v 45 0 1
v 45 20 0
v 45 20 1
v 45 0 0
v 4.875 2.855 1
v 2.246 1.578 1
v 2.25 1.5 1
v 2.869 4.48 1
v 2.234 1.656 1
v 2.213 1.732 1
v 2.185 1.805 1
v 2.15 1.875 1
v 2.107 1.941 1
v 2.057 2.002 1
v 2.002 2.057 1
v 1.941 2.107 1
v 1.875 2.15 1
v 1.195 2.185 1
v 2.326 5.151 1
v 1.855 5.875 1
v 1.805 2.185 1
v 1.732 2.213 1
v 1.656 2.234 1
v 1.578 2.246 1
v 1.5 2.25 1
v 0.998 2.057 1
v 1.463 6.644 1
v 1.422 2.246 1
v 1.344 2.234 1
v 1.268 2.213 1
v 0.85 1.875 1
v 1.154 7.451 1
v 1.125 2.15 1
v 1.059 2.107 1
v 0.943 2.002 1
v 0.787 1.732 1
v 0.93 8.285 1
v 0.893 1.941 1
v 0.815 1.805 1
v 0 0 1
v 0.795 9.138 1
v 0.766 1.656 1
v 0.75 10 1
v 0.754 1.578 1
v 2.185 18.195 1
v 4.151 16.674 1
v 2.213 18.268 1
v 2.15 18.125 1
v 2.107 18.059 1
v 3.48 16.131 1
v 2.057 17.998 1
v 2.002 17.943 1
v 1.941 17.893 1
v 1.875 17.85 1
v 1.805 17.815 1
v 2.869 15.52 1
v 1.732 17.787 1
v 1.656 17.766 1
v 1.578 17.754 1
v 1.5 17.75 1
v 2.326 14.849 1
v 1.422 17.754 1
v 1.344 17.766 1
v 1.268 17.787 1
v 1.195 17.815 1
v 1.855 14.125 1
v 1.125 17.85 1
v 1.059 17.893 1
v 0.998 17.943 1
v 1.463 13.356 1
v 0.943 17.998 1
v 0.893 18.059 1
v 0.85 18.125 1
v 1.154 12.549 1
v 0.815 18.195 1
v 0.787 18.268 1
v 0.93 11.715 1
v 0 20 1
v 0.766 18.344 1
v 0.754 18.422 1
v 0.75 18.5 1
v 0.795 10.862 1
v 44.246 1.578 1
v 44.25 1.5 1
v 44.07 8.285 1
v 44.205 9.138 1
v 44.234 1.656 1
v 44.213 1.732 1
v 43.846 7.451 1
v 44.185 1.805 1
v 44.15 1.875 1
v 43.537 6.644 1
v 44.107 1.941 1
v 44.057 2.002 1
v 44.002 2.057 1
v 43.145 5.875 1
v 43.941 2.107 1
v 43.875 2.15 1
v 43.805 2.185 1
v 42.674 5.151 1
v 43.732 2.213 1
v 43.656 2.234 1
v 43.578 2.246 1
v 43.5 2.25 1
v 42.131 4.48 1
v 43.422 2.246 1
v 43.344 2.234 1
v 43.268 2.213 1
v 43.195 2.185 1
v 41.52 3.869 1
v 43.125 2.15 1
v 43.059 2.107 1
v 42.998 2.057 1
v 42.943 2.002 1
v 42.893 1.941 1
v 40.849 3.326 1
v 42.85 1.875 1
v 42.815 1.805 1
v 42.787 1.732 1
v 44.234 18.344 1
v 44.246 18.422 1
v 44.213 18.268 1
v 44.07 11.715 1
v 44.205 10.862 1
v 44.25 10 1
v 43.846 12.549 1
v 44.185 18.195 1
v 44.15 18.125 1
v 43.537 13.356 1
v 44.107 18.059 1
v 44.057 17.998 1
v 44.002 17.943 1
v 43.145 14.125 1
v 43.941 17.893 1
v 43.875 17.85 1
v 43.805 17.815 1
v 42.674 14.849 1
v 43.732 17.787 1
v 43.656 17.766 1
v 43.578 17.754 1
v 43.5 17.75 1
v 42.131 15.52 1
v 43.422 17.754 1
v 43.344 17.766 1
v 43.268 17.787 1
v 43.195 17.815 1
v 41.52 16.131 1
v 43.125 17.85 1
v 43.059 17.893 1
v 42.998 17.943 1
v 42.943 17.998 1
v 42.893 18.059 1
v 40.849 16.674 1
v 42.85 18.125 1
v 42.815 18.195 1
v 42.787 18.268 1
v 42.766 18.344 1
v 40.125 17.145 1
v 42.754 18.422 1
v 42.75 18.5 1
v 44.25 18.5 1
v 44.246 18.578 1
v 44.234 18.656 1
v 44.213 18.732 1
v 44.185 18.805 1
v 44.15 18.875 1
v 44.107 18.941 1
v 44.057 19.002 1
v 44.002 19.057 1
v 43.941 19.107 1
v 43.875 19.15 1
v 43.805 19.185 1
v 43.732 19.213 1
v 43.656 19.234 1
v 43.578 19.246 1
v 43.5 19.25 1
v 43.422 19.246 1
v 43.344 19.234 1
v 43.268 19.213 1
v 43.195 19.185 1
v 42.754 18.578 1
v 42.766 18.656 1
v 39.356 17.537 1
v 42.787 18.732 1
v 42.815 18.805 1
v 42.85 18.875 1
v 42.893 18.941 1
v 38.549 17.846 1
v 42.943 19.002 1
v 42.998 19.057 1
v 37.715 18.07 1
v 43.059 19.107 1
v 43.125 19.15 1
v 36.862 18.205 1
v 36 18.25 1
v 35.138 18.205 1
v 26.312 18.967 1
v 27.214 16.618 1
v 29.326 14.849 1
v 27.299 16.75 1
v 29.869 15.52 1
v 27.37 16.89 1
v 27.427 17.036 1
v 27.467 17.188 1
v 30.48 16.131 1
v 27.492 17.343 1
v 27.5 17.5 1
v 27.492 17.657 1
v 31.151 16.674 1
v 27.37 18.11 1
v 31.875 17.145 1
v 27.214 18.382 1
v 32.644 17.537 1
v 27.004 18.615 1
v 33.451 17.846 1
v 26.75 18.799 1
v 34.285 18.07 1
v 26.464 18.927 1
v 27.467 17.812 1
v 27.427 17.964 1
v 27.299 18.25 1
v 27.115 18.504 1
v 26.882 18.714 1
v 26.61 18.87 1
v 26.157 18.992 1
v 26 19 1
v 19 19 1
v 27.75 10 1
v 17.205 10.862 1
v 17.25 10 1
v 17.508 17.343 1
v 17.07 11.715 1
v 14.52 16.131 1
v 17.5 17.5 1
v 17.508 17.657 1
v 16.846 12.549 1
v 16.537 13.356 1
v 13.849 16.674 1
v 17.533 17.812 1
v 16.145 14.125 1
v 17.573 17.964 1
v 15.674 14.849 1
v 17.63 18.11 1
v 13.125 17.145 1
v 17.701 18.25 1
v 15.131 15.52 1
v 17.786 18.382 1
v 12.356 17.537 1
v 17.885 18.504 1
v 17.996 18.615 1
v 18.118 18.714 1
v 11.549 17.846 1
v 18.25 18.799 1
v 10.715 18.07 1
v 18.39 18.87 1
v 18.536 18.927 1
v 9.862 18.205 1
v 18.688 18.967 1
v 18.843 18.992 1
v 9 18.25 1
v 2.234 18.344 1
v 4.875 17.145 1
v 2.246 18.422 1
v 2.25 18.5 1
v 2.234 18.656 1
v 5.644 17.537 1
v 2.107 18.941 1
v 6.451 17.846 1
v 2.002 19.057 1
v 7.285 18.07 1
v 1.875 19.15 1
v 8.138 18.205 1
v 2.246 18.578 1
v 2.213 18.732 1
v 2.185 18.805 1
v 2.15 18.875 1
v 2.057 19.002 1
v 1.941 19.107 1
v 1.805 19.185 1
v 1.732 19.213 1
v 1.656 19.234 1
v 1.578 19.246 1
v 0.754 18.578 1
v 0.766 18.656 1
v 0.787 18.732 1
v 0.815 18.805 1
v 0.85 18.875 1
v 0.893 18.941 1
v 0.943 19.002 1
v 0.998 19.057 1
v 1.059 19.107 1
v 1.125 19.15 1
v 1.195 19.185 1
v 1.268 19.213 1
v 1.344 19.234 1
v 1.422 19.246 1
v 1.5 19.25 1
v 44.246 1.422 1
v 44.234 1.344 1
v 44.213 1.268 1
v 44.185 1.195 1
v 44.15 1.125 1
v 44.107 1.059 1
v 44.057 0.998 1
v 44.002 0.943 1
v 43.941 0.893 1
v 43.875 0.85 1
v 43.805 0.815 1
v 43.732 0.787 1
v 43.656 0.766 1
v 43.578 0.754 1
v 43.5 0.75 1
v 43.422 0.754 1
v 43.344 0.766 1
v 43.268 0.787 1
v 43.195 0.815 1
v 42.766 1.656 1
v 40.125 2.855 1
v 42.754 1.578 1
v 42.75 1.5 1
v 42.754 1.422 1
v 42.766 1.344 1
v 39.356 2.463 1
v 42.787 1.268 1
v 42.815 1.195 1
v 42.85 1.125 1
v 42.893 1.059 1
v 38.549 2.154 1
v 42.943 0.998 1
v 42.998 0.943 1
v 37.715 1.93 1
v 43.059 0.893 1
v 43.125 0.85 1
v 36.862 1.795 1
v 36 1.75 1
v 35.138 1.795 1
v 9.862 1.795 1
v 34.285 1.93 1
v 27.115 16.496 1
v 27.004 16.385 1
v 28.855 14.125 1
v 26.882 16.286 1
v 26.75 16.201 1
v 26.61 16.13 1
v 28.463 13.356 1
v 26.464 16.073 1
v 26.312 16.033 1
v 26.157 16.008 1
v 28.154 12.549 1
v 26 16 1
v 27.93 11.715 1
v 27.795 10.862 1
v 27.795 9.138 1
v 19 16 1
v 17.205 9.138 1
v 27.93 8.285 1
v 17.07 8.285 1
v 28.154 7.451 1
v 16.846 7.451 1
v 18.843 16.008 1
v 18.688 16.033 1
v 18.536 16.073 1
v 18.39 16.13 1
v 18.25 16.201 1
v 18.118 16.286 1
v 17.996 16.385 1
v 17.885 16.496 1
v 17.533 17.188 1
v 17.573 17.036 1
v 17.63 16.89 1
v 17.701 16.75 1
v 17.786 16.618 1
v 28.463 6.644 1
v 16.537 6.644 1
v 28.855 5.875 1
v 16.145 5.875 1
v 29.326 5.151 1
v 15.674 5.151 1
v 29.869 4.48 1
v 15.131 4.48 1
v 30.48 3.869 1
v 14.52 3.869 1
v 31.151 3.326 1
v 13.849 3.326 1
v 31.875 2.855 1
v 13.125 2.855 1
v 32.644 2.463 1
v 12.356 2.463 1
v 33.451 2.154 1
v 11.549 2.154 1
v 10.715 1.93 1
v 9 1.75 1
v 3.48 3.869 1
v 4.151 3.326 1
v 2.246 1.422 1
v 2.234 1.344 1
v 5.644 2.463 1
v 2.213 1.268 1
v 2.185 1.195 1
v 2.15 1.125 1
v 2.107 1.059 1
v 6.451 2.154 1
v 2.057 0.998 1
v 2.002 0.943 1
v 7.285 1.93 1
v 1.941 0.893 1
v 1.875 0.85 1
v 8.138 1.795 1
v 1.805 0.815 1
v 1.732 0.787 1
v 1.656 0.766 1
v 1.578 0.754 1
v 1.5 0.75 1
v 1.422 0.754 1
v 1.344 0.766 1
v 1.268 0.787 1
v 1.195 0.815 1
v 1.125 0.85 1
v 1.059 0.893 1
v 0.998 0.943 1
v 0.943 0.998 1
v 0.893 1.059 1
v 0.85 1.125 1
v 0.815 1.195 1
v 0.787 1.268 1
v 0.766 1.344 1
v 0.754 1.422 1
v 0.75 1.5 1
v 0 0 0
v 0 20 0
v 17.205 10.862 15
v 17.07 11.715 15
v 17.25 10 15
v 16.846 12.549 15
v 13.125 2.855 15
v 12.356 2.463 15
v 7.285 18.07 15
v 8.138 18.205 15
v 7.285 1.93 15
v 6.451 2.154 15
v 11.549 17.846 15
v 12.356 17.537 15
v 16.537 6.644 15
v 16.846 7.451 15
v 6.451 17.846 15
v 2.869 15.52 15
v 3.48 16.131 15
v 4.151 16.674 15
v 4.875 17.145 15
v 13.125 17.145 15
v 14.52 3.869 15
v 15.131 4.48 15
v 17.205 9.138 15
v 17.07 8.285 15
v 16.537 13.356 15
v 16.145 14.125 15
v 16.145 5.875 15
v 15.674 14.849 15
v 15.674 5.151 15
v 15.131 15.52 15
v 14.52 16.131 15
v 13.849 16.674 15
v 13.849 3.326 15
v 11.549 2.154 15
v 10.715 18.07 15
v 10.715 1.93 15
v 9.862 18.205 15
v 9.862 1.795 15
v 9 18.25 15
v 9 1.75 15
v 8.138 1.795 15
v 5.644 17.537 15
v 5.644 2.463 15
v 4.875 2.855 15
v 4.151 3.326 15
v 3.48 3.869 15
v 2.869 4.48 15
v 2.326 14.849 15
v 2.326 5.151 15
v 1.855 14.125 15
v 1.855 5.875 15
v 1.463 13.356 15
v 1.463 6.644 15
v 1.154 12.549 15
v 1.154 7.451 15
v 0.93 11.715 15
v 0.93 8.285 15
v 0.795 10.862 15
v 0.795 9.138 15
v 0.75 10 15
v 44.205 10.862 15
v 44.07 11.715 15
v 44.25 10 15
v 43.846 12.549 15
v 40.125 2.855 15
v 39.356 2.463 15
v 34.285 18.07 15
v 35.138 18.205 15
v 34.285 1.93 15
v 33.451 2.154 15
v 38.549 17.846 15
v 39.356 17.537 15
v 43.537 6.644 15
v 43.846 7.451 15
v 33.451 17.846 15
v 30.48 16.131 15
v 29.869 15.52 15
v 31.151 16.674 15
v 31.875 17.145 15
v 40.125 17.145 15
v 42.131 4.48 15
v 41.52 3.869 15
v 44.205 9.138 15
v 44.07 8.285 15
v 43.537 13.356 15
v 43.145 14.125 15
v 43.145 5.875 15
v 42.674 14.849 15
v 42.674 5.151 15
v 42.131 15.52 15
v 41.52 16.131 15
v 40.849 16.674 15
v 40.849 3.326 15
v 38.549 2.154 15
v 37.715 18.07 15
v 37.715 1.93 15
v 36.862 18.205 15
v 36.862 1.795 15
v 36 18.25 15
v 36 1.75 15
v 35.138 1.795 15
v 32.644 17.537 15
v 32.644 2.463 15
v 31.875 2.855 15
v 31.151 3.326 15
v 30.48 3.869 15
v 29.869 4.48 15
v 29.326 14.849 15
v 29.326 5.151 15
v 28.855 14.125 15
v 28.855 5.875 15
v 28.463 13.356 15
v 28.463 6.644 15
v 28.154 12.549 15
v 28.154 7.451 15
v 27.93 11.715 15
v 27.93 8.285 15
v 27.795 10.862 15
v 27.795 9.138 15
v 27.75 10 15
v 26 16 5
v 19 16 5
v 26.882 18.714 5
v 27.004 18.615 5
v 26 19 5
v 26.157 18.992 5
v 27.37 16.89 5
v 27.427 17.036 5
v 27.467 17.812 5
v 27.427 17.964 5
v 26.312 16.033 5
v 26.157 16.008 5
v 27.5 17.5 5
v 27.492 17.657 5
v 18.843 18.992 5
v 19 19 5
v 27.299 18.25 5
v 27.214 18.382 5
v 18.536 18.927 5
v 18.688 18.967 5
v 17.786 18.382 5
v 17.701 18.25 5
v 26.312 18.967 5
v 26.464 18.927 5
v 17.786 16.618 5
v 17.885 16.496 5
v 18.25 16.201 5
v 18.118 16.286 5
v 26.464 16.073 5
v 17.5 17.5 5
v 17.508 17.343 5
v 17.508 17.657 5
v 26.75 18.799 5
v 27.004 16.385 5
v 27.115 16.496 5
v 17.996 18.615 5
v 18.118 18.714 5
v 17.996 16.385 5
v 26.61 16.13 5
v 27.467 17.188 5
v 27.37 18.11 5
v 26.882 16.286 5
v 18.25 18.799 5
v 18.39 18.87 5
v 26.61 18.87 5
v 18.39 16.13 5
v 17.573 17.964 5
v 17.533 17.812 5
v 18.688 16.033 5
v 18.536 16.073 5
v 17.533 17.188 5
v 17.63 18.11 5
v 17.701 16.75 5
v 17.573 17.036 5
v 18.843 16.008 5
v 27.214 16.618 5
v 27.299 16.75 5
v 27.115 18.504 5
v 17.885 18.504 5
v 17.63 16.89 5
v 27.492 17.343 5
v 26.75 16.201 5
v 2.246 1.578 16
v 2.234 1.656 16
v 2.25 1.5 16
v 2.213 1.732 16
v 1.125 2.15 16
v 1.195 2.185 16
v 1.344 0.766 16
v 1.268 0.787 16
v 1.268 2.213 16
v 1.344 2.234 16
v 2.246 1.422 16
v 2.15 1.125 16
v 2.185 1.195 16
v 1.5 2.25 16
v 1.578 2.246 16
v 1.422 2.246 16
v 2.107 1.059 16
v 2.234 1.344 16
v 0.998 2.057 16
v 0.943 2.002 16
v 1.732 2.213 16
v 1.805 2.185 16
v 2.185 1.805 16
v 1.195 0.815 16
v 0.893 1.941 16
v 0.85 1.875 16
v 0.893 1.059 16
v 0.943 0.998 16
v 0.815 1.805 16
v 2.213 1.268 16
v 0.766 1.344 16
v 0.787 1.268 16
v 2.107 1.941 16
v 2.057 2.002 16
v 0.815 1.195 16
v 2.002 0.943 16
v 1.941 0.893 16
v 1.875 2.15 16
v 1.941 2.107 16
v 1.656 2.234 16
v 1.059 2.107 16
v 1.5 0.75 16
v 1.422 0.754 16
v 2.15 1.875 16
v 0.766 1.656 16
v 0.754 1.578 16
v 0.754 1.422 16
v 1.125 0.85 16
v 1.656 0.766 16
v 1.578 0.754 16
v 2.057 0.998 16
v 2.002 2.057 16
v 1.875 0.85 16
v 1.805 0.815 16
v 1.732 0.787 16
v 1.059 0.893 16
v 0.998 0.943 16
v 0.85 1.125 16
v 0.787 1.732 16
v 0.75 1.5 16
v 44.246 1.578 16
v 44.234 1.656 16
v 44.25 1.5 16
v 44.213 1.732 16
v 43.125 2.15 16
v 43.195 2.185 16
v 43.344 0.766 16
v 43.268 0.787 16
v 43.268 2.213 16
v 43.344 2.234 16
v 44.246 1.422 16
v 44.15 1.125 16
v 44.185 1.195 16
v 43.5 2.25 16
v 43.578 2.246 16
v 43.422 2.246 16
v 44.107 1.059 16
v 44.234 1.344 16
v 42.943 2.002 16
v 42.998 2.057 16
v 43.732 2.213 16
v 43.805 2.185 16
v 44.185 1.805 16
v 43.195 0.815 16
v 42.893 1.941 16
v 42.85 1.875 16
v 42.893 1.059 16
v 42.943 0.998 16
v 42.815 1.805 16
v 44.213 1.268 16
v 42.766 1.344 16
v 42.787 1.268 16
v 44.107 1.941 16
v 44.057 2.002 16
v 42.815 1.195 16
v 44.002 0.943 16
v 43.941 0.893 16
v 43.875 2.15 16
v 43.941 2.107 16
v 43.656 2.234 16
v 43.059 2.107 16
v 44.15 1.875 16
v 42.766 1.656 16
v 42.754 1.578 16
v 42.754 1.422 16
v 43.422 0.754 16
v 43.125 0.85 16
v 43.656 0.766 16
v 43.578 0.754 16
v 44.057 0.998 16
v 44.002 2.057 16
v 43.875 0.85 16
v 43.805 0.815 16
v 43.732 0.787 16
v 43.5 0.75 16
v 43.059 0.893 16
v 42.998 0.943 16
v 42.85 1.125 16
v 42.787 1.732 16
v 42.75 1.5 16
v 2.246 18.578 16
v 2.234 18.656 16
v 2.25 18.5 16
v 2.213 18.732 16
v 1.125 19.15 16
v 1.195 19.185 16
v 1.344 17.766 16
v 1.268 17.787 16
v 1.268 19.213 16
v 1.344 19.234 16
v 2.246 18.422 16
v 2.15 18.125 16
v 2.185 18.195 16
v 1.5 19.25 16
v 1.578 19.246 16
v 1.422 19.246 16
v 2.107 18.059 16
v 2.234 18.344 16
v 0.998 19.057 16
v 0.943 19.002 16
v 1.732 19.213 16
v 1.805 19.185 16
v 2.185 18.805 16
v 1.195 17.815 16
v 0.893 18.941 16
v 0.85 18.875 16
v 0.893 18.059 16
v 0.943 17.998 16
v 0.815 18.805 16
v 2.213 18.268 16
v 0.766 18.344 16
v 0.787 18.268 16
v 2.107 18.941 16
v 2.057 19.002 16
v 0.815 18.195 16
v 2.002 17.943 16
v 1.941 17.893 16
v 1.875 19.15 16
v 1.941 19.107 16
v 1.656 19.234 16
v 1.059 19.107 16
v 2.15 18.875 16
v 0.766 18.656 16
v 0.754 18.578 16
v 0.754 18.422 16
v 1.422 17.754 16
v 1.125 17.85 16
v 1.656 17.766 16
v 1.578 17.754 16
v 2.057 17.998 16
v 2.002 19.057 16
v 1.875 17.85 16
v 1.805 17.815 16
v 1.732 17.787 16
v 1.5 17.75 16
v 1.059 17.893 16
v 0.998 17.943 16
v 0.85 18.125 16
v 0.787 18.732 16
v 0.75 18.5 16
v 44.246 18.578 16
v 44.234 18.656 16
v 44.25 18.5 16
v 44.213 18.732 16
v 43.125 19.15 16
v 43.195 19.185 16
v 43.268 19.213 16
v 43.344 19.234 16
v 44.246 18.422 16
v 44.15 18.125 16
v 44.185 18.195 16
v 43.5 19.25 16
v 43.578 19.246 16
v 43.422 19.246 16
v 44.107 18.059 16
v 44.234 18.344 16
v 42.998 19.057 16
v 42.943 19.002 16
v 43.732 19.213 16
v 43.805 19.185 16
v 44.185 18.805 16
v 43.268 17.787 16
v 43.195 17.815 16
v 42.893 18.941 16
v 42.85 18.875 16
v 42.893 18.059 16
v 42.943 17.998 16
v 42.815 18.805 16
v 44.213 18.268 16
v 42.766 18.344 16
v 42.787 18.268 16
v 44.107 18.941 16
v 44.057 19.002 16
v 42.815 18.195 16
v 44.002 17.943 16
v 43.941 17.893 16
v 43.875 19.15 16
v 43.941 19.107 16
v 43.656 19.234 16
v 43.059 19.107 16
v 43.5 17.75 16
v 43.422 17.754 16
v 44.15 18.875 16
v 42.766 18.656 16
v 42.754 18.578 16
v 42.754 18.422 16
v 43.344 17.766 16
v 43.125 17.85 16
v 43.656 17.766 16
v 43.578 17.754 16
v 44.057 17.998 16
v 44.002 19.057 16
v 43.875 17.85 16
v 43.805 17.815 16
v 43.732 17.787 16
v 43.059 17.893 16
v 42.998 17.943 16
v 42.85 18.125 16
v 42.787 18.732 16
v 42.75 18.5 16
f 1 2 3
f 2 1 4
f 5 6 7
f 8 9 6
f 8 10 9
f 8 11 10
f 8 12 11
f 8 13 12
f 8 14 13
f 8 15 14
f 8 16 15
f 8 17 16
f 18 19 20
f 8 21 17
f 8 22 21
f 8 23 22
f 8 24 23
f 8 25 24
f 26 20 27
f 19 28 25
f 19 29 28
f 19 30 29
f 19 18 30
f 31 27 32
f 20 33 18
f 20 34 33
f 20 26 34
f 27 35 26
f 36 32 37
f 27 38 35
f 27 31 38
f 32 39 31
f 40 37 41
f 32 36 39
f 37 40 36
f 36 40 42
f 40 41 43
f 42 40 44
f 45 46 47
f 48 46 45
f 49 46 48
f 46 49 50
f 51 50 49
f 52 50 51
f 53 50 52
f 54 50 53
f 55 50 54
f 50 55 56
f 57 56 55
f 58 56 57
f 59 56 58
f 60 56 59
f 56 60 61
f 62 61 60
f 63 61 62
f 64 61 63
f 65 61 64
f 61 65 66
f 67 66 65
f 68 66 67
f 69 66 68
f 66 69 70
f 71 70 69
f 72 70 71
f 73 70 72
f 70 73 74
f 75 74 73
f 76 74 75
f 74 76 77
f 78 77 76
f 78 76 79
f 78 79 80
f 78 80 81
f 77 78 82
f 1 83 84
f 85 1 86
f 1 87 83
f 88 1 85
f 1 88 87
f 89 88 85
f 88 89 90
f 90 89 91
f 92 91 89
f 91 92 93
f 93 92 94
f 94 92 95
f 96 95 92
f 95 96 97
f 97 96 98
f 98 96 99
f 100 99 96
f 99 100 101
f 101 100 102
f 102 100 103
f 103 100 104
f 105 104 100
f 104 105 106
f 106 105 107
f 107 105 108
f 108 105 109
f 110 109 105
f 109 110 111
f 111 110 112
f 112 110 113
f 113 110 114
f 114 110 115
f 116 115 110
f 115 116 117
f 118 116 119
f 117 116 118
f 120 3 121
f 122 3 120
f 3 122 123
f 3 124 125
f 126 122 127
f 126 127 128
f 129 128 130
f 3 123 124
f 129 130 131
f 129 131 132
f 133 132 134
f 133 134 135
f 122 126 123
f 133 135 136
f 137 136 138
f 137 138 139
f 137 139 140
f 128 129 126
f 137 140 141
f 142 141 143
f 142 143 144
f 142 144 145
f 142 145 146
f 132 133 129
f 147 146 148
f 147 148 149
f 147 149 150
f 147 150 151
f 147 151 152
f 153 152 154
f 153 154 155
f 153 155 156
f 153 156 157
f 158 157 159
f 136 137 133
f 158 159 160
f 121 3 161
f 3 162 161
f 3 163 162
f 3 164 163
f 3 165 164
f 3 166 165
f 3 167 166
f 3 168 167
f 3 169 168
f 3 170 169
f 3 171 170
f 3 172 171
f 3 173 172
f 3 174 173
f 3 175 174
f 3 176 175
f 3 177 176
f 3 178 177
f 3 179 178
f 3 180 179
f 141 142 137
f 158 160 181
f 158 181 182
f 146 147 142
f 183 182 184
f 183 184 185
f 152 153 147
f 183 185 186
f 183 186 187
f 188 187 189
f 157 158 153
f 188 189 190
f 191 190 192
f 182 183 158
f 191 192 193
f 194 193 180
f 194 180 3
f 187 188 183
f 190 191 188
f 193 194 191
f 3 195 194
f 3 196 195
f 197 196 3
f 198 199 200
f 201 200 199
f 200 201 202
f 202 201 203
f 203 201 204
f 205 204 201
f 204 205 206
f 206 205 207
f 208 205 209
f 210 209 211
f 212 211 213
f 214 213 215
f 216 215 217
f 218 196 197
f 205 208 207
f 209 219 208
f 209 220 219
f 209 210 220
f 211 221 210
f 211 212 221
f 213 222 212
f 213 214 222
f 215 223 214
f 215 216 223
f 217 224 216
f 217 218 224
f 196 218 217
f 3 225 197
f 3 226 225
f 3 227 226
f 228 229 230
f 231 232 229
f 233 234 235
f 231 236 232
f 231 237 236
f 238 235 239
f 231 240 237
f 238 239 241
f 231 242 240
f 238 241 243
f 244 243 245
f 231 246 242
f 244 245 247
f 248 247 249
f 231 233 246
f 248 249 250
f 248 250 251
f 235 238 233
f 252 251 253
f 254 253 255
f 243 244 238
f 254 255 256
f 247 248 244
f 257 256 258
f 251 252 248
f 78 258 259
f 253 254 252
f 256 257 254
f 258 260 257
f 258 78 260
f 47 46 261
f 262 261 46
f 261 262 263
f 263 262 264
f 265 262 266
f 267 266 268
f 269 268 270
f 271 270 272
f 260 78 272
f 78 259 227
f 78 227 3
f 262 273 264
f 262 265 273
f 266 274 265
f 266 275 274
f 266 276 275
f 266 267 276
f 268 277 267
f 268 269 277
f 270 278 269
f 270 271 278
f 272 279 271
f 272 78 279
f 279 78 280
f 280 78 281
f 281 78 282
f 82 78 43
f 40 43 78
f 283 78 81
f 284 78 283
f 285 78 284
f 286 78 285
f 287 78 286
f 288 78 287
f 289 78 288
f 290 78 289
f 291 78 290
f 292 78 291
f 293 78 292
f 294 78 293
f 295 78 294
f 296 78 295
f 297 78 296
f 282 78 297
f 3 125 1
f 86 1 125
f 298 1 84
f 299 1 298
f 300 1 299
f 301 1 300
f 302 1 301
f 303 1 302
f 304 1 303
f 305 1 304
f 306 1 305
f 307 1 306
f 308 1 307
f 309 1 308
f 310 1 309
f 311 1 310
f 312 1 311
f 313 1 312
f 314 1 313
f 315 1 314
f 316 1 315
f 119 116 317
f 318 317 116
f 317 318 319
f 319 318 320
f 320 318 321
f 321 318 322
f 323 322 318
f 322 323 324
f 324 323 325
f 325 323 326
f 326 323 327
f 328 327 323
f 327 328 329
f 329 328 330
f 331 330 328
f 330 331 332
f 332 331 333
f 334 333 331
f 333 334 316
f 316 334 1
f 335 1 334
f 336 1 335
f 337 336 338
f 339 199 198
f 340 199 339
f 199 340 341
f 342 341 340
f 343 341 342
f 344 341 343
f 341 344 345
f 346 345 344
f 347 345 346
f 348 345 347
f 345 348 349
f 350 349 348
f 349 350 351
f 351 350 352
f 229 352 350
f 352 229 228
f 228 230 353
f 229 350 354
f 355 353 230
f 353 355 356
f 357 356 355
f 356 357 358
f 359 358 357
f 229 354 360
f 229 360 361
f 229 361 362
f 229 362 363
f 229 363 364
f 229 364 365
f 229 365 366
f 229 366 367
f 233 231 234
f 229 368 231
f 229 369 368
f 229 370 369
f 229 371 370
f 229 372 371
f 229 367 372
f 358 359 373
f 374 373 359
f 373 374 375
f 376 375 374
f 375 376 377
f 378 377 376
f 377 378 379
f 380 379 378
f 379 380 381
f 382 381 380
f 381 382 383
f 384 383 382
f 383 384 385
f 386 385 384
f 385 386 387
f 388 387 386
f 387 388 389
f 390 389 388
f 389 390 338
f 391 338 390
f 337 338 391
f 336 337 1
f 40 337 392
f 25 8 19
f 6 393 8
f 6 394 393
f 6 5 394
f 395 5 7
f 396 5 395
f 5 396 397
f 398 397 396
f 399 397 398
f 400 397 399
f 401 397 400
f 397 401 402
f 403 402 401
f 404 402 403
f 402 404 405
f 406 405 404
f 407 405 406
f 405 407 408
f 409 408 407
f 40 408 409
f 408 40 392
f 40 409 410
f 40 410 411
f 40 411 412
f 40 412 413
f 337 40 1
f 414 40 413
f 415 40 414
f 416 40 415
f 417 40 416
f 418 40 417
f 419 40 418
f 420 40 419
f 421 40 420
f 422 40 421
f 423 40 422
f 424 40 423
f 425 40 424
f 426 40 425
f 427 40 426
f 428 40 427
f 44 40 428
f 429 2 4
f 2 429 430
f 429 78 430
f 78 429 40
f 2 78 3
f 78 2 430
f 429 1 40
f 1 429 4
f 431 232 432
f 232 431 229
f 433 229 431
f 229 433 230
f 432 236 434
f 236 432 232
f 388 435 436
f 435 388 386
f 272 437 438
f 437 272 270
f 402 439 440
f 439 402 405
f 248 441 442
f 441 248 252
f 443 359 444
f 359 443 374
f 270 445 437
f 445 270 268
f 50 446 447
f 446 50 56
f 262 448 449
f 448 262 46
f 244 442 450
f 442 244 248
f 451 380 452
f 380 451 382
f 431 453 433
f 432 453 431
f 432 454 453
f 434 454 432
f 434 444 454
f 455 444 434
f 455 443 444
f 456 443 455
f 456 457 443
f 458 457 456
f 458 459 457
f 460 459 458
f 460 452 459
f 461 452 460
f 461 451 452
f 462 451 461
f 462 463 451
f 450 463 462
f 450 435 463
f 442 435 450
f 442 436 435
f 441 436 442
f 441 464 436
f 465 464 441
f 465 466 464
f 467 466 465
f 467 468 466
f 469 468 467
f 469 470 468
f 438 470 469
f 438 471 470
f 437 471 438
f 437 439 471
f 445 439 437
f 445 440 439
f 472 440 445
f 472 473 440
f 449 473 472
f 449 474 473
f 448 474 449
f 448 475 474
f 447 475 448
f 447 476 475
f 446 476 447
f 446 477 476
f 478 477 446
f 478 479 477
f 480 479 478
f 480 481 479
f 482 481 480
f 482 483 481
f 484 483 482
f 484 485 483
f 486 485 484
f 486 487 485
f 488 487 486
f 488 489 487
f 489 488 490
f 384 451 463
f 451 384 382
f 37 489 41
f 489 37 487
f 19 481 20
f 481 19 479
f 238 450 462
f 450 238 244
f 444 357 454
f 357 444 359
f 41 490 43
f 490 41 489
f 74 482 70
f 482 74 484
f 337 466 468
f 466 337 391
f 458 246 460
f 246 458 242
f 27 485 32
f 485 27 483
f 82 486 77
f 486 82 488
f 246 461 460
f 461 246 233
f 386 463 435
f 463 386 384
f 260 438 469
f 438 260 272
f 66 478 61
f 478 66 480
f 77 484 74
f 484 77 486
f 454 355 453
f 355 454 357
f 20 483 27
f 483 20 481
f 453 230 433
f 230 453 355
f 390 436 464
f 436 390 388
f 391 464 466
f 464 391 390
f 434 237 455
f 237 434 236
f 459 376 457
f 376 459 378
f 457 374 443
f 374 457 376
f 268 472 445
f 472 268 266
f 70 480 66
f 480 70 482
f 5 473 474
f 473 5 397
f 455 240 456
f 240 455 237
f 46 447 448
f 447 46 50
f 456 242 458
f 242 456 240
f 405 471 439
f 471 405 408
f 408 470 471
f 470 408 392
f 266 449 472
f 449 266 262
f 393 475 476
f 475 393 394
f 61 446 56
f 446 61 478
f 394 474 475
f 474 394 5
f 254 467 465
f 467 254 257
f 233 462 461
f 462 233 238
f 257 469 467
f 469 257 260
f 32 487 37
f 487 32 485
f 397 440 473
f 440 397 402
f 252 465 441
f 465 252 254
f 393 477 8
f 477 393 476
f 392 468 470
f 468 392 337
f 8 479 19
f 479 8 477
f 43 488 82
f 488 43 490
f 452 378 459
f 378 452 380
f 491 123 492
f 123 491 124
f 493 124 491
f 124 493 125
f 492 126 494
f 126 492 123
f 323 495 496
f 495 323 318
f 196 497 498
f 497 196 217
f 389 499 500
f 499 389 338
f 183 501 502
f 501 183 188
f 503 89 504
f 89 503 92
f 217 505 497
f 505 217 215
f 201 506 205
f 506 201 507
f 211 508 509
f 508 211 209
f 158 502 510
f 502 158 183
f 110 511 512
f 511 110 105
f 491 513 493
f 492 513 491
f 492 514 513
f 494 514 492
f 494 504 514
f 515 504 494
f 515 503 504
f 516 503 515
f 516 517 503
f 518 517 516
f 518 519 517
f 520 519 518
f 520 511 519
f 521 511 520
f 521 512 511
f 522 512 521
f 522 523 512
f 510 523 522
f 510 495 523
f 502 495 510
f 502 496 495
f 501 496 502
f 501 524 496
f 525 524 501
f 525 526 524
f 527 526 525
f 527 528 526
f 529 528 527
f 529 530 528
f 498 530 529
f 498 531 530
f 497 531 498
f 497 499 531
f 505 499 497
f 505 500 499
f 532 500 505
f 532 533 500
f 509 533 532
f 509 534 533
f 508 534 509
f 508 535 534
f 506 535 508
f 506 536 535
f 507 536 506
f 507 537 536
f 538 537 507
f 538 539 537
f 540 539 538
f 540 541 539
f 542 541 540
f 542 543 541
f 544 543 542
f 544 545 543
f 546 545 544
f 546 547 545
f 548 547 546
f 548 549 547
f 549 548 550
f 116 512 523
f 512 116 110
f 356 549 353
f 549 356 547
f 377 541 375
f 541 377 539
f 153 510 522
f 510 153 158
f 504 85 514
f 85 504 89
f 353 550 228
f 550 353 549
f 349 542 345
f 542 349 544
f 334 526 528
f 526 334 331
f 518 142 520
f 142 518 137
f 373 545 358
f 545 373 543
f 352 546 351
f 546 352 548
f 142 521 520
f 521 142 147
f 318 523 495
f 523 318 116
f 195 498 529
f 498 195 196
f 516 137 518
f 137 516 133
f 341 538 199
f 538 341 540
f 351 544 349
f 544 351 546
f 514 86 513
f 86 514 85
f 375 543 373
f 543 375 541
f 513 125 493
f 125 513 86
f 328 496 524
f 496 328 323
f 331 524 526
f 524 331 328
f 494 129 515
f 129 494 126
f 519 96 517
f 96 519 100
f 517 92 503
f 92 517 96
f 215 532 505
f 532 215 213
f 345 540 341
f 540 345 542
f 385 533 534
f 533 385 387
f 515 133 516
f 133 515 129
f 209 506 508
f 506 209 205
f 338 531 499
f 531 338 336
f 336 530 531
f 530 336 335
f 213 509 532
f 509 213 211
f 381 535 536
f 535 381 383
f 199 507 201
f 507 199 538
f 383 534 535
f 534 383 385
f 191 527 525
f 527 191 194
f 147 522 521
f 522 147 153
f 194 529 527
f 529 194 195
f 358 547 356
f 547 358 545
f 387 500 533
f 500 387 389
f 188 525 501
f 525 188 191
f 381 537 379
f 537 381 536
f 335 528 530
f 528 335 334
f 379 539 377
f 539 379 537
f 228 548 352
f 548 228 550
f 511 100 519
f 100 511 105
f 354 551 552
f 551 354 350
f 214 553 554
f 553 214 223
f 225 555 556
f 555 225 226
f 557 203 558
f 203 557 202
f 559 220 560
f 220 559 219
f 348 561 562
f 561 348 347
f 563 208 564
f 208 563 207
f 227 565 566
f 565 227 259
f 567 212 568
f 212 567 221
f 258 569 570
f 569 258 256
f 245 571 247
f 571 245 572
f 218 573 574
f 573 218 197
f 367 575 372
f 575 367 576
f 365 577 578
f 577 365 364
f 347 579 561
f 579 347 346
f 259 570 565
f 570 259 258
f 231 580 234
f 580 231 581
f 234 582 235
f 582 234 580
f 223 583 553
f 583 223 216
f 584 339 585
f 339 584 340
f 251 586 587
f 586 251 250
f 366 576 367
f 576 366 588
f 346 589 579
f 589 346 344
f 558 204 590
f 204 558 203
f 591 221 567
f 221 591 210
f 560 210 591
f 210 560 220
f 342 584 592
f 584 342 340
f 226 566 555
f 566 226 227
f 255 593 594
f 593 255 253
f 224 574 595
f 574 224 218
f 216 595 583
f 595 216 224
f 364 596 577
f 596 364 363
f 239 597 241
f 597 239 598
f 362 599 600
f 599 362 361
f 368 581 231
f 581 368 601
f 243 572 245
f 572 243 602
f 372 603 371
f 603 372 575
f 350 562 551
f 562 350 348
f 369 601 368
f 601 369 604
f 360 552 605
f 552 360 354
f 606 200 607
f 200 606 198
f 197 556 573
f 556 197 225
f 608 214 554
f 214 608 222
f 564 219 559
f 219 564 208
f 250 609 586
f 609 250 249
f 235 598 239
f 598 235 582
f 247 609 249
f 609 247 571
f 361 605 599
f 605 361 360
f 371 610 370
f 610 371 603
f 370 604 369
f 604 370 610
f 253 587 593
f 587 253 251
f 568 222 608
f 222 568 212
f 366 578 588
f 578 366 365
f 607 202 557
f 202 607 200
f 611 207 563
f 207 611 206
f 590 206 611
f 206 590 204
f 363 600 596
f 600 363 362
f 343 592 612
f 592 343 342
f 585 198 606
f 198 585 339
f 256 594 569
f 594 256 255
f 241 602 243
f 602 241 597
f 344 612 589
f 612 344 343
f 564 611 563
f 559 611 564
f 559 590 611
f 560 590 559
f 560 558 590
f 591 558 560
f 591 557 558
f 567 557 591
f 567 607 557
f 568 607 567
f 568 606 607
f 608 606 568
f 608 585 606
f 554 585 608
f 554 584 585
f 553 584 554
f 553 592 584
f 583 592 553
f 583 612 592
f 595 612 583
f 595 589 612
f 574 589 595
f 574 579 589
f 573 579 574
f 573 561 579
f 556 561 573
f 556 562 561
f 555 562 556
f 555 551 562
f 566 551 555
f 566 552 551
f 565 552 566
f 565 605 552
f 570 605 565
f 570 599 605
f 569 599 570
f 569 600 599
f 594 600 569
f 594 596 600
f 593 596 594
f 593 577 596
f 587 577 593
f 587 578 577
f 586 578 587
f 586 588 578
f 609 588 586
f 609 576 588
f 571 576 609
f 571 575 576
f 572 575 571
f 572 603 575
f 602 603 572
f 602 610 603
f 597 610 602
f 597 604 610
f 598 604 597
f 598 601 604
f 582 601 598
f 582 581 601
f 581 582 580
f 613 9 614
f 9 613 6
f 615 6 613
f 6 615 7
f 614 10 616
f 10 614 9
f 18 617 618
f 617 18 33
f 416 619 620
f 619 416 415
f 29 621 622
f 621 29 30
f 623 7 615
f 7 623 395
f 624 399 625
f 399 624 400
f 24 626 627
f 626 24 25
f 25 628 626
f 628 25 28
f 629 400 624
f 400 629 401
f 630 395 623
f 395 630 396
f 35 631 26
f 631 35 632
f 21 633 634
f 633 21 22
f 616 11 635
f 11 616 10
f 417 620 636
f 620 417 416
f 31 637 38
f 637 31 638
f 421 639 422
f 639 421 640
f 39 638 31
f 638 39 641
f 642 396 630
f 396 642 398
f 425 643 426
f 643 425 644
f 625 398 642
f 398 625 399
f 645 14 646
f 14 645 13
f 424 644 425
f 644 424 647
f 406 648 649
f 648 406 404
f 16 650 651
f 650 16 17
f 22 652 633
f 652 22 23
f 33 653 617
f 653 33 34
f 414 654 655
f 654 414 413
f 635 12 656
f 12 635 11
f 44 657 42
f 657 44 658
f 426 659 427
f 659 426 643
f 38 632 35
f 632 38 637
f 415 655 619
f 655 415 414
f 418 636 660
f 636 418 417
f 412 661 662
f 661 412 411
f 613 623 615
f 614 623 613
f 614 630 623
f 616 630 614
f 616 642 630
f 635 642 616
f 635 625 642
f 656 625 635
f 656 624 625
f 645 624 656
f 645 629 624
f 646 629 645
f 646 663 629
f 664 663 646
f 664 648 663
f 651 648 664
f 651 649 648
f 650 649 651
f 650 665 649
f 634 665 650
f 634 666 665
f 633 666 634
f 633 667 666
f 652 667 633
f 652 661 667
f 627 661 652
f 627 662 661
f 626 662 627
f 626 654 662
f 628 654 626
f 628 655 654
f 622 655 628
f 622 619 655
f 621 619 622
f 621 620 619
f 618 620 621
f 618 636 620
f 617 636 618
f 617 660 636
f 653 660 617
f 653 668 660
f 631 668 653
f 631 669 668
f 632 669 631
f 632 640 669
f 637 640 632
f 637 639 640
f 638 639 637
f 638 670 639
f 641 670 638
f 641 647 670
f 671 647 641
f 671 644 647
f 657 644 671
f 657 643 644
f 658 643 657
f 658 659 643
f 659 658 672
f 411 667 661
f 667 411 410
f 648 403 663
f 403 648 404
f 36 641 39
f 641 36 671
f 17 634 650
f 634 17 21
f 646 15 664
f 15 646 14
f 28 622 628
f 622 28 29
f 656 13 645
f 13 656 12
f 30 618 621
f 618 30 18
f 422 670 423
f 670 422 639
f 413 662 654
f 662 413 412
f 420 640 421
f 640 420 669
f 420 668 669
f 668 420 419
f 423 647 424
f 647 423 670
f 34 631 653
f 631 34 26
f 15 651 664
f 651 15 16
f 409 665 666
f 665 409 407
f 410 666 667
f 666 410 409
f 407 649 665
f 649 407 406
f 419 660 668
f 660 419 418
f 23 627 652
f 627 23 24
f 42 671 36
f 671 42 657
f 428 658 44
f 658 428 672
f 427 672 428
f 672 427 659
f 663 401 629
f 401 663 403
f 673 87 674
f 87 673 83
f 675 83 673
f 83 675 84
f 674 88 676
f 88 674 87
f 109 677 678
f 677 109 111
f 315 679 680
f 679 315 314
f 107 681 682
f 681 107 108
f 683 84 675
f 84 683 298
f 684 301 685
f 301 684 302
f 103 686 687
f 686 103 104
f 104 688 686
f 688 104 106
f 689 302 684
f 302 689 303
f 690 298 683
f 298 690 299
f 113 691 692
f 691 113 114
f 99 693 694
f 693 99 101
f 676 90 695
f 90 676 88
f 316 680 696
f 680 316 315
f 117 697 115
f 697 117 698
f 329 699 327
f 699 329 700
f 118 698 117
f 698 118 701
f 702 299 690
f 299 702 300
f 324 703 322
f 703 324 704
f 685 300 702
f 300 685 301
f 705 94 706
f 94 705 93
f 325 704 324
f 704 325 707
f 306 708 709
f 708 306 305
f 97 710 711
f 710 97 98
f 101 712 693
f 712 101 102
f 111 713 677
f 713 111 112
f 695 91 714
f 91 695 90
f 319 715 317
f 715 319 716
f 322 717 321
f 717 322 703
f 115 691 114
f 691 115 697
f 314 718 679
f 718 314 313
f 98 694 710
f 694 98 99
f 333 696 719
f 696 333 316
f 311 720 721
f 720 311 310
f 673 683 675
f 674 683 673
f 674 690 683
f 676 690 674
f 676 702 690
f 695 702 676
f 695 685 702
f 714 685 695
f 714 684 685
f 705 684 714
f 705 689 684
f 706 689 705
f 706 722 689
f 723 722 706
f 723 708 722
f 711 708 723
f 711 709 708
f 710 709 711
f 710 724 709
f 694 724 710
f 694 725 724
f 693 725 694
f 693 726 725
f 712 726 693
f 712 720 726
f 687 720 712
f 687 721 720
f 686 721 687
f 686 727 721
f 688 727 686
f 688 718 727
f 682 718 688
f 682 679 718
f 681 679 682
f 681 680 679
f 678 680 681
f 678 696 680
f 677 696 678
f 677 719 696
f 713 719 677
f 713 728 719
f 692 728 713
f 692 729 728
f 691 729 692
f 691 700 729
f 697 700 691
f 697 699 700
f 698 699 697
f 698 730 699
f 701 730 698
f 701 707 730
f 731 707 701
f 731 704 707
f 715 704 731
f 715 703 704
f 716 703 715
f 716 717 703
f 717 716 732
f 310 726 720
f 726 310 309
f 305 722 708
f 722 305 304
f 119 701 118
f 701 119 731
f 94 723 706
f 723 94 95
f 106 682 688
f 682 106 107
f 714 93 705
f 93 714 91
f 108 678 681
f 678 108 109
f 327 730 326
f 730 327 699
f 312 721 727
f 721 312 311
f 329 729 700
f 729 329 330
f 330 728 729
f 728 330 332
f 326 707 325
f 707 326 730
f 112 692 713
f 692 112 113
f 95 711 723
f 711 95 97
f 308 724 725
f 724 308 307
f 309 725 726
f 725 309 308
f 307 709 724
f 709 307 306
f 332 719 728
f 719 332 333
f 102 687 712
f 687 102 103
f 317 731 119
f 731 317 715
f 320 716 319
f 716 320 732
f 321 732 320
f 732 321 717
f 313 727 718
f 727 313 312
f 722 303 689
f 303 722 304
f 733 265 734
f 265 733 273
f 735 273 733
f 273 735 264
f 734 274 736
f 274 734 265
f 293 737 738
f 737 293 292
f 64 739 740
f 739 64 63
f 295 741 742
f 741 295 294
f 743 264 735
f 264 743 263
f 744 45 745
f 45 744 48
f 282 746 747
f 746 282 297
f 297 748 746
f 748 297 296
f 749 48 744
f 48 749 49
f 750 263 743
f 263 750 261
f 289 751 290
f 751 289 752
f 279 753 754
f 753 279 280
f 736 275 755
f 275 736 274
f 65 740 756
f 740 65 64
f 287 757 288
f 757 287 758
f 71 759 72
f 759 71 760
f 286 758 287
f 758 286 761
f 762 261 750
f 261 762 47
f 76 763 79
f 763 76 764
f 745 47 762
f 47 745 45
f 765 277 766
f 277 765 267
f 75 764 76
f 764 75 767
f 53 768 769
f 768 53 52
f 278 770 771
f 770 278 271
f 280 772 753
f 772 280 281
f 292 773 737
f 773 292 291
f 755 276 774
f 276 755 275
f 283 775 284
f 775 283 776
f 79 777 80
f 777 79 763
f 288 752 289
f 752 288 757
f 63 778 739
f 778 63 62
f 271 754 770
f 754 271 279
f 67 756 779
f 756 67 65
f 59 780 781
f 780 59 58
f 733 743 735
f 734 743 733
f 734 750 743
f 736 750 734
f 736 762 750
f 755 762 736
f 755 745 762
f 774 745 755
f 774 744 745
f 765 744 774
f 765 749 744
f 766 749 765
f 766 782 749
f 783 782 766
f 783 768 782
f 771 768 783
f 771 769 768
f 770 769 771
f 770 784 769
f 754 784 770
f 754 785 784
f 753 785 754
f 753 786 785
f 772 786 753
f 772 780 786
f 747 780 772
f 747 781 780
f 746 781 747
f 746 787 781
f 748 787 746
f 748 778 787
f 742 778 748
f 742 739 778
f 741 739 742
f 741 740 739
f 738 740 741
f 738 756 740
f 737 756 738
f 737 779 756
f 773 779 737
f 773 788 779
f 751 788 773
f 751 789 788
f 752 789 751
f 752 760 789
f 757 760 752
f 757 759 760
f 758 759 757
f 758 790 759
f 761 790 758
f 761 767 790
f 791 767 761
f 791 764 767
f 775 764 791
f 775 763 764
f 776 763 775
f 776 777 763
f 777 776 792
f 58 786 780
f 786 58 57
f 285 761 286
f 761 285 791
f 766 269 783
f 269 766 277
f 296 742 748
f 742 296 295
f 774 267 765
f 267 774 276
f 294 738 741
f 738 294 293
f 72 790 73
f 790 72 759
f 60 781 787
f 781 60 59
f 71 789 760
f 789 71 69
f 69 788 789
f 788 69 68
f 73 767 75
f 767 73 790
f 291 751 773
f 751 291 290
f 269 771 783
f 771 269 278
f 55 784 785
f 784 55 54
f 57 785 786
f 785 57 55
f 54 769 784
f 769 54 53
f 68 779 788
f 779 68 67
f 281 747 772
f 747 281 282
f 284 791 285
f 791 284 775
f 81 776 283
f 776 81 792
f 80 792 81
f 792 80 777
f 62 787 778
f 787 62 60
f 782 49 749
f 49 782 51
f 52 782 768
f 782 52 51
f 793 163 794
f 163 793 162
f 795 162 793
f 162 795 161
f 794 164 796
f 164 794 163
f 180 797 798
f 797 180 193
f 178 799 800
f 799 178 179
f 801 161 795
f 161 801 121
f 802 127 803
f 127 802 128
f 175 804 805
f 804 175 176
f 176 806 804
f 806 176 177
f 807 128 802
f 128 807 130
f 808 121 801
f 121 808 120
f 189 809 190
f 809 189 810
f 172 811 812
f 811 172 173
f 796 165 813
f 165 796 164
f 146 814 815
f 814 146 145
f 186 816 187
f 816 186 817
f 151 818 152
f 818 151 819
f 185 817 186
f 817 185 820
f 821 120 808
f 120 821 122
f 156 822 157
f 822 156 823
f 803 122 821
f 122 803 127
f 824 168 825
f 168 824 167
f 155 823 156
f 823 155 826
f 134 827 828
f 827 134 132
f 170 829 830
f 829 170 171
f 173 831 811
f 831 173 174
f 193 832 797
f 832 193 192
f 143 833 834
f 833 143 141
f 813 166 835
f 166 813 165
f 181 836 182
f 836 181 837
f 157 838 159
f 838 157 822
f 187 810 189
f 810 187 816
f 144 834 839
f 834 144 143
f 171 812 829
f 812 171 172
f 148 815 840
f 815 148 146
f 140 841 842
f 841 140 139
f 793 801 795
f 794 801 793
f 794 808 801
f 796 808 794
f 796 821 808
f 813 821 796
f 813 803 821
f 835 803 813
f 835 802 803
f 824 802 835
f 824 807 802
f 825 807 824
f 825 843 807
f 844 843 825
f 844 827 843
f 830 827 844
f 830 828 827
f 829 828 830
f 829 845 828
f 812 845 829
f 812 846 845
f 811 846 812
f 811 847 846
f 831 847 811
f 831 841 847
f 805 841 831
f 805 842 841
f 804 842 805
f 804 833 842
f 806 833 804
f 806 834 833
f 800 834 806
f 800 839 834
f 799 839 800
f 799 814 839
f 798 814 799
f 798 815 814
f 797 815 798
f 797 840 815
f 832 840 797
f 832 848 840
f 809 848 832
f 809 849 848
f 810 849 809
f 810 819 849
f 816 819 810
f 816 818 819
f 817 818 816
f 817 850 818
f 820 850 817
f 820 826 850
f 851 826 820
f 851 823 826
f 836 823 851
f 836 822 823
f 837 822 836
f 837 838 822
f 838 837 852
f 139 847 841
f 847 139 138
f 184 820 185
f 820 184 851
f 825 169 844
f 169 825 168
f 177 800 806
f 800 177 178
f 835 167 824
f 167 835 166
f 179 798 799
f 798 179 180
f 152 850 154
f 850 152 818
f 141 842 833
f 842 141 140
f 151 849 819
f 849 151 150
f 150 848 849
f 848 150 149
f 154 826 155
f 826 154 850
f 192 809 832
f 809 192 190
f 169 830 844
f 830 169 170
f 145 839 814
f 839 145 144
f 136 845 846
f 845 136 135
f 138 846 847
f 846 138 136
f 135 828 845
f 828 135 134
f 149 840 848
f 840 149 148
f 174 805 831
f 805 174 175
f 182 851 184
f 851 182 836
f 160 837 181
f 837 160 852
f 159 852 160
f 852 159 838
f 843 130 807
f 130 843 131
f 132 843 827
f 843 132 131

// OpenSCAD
//$fn=60;
sens_d = 16+0.5;
sens_h = 15;

HC_SR04();

module HC_SR04() {
    union(){
        union(){
            // base
            cube([45,20,1]);
            // tranducers
            translate([9,10,0])cylinder(d=sens_d,h=sens_h,$fn=60);
            translate([45-9,10,0])cylinder(d=sens_d,h=sens_h,$fn=60);
            // cristal
            translate([45/2-7/2, 20-1-3/2,0])hull(){
                cylinder(d=3, h=5,$fn=60);
                translate([7,0,0])cylinder(d=3, h=5,$fn=60);
            } // of hull()
        } // of inner union()
        
        // for the screw holes
        translate([1.5,1.5,0])cylinder(d=1.5,h=16,$fn=60);
        translate([45-1.5,1.5,0])cylinder(d=1.5,h=16,$fn=60);
        translate([1.5,20-1.5,0])cylinder(d=1.5,h=16,$fn=60);
        translate([45-1.5,20-1.5,0])cylinder(d=1.5,h=16,$fn=60);
    } // of outer union
    
} // of SR04
